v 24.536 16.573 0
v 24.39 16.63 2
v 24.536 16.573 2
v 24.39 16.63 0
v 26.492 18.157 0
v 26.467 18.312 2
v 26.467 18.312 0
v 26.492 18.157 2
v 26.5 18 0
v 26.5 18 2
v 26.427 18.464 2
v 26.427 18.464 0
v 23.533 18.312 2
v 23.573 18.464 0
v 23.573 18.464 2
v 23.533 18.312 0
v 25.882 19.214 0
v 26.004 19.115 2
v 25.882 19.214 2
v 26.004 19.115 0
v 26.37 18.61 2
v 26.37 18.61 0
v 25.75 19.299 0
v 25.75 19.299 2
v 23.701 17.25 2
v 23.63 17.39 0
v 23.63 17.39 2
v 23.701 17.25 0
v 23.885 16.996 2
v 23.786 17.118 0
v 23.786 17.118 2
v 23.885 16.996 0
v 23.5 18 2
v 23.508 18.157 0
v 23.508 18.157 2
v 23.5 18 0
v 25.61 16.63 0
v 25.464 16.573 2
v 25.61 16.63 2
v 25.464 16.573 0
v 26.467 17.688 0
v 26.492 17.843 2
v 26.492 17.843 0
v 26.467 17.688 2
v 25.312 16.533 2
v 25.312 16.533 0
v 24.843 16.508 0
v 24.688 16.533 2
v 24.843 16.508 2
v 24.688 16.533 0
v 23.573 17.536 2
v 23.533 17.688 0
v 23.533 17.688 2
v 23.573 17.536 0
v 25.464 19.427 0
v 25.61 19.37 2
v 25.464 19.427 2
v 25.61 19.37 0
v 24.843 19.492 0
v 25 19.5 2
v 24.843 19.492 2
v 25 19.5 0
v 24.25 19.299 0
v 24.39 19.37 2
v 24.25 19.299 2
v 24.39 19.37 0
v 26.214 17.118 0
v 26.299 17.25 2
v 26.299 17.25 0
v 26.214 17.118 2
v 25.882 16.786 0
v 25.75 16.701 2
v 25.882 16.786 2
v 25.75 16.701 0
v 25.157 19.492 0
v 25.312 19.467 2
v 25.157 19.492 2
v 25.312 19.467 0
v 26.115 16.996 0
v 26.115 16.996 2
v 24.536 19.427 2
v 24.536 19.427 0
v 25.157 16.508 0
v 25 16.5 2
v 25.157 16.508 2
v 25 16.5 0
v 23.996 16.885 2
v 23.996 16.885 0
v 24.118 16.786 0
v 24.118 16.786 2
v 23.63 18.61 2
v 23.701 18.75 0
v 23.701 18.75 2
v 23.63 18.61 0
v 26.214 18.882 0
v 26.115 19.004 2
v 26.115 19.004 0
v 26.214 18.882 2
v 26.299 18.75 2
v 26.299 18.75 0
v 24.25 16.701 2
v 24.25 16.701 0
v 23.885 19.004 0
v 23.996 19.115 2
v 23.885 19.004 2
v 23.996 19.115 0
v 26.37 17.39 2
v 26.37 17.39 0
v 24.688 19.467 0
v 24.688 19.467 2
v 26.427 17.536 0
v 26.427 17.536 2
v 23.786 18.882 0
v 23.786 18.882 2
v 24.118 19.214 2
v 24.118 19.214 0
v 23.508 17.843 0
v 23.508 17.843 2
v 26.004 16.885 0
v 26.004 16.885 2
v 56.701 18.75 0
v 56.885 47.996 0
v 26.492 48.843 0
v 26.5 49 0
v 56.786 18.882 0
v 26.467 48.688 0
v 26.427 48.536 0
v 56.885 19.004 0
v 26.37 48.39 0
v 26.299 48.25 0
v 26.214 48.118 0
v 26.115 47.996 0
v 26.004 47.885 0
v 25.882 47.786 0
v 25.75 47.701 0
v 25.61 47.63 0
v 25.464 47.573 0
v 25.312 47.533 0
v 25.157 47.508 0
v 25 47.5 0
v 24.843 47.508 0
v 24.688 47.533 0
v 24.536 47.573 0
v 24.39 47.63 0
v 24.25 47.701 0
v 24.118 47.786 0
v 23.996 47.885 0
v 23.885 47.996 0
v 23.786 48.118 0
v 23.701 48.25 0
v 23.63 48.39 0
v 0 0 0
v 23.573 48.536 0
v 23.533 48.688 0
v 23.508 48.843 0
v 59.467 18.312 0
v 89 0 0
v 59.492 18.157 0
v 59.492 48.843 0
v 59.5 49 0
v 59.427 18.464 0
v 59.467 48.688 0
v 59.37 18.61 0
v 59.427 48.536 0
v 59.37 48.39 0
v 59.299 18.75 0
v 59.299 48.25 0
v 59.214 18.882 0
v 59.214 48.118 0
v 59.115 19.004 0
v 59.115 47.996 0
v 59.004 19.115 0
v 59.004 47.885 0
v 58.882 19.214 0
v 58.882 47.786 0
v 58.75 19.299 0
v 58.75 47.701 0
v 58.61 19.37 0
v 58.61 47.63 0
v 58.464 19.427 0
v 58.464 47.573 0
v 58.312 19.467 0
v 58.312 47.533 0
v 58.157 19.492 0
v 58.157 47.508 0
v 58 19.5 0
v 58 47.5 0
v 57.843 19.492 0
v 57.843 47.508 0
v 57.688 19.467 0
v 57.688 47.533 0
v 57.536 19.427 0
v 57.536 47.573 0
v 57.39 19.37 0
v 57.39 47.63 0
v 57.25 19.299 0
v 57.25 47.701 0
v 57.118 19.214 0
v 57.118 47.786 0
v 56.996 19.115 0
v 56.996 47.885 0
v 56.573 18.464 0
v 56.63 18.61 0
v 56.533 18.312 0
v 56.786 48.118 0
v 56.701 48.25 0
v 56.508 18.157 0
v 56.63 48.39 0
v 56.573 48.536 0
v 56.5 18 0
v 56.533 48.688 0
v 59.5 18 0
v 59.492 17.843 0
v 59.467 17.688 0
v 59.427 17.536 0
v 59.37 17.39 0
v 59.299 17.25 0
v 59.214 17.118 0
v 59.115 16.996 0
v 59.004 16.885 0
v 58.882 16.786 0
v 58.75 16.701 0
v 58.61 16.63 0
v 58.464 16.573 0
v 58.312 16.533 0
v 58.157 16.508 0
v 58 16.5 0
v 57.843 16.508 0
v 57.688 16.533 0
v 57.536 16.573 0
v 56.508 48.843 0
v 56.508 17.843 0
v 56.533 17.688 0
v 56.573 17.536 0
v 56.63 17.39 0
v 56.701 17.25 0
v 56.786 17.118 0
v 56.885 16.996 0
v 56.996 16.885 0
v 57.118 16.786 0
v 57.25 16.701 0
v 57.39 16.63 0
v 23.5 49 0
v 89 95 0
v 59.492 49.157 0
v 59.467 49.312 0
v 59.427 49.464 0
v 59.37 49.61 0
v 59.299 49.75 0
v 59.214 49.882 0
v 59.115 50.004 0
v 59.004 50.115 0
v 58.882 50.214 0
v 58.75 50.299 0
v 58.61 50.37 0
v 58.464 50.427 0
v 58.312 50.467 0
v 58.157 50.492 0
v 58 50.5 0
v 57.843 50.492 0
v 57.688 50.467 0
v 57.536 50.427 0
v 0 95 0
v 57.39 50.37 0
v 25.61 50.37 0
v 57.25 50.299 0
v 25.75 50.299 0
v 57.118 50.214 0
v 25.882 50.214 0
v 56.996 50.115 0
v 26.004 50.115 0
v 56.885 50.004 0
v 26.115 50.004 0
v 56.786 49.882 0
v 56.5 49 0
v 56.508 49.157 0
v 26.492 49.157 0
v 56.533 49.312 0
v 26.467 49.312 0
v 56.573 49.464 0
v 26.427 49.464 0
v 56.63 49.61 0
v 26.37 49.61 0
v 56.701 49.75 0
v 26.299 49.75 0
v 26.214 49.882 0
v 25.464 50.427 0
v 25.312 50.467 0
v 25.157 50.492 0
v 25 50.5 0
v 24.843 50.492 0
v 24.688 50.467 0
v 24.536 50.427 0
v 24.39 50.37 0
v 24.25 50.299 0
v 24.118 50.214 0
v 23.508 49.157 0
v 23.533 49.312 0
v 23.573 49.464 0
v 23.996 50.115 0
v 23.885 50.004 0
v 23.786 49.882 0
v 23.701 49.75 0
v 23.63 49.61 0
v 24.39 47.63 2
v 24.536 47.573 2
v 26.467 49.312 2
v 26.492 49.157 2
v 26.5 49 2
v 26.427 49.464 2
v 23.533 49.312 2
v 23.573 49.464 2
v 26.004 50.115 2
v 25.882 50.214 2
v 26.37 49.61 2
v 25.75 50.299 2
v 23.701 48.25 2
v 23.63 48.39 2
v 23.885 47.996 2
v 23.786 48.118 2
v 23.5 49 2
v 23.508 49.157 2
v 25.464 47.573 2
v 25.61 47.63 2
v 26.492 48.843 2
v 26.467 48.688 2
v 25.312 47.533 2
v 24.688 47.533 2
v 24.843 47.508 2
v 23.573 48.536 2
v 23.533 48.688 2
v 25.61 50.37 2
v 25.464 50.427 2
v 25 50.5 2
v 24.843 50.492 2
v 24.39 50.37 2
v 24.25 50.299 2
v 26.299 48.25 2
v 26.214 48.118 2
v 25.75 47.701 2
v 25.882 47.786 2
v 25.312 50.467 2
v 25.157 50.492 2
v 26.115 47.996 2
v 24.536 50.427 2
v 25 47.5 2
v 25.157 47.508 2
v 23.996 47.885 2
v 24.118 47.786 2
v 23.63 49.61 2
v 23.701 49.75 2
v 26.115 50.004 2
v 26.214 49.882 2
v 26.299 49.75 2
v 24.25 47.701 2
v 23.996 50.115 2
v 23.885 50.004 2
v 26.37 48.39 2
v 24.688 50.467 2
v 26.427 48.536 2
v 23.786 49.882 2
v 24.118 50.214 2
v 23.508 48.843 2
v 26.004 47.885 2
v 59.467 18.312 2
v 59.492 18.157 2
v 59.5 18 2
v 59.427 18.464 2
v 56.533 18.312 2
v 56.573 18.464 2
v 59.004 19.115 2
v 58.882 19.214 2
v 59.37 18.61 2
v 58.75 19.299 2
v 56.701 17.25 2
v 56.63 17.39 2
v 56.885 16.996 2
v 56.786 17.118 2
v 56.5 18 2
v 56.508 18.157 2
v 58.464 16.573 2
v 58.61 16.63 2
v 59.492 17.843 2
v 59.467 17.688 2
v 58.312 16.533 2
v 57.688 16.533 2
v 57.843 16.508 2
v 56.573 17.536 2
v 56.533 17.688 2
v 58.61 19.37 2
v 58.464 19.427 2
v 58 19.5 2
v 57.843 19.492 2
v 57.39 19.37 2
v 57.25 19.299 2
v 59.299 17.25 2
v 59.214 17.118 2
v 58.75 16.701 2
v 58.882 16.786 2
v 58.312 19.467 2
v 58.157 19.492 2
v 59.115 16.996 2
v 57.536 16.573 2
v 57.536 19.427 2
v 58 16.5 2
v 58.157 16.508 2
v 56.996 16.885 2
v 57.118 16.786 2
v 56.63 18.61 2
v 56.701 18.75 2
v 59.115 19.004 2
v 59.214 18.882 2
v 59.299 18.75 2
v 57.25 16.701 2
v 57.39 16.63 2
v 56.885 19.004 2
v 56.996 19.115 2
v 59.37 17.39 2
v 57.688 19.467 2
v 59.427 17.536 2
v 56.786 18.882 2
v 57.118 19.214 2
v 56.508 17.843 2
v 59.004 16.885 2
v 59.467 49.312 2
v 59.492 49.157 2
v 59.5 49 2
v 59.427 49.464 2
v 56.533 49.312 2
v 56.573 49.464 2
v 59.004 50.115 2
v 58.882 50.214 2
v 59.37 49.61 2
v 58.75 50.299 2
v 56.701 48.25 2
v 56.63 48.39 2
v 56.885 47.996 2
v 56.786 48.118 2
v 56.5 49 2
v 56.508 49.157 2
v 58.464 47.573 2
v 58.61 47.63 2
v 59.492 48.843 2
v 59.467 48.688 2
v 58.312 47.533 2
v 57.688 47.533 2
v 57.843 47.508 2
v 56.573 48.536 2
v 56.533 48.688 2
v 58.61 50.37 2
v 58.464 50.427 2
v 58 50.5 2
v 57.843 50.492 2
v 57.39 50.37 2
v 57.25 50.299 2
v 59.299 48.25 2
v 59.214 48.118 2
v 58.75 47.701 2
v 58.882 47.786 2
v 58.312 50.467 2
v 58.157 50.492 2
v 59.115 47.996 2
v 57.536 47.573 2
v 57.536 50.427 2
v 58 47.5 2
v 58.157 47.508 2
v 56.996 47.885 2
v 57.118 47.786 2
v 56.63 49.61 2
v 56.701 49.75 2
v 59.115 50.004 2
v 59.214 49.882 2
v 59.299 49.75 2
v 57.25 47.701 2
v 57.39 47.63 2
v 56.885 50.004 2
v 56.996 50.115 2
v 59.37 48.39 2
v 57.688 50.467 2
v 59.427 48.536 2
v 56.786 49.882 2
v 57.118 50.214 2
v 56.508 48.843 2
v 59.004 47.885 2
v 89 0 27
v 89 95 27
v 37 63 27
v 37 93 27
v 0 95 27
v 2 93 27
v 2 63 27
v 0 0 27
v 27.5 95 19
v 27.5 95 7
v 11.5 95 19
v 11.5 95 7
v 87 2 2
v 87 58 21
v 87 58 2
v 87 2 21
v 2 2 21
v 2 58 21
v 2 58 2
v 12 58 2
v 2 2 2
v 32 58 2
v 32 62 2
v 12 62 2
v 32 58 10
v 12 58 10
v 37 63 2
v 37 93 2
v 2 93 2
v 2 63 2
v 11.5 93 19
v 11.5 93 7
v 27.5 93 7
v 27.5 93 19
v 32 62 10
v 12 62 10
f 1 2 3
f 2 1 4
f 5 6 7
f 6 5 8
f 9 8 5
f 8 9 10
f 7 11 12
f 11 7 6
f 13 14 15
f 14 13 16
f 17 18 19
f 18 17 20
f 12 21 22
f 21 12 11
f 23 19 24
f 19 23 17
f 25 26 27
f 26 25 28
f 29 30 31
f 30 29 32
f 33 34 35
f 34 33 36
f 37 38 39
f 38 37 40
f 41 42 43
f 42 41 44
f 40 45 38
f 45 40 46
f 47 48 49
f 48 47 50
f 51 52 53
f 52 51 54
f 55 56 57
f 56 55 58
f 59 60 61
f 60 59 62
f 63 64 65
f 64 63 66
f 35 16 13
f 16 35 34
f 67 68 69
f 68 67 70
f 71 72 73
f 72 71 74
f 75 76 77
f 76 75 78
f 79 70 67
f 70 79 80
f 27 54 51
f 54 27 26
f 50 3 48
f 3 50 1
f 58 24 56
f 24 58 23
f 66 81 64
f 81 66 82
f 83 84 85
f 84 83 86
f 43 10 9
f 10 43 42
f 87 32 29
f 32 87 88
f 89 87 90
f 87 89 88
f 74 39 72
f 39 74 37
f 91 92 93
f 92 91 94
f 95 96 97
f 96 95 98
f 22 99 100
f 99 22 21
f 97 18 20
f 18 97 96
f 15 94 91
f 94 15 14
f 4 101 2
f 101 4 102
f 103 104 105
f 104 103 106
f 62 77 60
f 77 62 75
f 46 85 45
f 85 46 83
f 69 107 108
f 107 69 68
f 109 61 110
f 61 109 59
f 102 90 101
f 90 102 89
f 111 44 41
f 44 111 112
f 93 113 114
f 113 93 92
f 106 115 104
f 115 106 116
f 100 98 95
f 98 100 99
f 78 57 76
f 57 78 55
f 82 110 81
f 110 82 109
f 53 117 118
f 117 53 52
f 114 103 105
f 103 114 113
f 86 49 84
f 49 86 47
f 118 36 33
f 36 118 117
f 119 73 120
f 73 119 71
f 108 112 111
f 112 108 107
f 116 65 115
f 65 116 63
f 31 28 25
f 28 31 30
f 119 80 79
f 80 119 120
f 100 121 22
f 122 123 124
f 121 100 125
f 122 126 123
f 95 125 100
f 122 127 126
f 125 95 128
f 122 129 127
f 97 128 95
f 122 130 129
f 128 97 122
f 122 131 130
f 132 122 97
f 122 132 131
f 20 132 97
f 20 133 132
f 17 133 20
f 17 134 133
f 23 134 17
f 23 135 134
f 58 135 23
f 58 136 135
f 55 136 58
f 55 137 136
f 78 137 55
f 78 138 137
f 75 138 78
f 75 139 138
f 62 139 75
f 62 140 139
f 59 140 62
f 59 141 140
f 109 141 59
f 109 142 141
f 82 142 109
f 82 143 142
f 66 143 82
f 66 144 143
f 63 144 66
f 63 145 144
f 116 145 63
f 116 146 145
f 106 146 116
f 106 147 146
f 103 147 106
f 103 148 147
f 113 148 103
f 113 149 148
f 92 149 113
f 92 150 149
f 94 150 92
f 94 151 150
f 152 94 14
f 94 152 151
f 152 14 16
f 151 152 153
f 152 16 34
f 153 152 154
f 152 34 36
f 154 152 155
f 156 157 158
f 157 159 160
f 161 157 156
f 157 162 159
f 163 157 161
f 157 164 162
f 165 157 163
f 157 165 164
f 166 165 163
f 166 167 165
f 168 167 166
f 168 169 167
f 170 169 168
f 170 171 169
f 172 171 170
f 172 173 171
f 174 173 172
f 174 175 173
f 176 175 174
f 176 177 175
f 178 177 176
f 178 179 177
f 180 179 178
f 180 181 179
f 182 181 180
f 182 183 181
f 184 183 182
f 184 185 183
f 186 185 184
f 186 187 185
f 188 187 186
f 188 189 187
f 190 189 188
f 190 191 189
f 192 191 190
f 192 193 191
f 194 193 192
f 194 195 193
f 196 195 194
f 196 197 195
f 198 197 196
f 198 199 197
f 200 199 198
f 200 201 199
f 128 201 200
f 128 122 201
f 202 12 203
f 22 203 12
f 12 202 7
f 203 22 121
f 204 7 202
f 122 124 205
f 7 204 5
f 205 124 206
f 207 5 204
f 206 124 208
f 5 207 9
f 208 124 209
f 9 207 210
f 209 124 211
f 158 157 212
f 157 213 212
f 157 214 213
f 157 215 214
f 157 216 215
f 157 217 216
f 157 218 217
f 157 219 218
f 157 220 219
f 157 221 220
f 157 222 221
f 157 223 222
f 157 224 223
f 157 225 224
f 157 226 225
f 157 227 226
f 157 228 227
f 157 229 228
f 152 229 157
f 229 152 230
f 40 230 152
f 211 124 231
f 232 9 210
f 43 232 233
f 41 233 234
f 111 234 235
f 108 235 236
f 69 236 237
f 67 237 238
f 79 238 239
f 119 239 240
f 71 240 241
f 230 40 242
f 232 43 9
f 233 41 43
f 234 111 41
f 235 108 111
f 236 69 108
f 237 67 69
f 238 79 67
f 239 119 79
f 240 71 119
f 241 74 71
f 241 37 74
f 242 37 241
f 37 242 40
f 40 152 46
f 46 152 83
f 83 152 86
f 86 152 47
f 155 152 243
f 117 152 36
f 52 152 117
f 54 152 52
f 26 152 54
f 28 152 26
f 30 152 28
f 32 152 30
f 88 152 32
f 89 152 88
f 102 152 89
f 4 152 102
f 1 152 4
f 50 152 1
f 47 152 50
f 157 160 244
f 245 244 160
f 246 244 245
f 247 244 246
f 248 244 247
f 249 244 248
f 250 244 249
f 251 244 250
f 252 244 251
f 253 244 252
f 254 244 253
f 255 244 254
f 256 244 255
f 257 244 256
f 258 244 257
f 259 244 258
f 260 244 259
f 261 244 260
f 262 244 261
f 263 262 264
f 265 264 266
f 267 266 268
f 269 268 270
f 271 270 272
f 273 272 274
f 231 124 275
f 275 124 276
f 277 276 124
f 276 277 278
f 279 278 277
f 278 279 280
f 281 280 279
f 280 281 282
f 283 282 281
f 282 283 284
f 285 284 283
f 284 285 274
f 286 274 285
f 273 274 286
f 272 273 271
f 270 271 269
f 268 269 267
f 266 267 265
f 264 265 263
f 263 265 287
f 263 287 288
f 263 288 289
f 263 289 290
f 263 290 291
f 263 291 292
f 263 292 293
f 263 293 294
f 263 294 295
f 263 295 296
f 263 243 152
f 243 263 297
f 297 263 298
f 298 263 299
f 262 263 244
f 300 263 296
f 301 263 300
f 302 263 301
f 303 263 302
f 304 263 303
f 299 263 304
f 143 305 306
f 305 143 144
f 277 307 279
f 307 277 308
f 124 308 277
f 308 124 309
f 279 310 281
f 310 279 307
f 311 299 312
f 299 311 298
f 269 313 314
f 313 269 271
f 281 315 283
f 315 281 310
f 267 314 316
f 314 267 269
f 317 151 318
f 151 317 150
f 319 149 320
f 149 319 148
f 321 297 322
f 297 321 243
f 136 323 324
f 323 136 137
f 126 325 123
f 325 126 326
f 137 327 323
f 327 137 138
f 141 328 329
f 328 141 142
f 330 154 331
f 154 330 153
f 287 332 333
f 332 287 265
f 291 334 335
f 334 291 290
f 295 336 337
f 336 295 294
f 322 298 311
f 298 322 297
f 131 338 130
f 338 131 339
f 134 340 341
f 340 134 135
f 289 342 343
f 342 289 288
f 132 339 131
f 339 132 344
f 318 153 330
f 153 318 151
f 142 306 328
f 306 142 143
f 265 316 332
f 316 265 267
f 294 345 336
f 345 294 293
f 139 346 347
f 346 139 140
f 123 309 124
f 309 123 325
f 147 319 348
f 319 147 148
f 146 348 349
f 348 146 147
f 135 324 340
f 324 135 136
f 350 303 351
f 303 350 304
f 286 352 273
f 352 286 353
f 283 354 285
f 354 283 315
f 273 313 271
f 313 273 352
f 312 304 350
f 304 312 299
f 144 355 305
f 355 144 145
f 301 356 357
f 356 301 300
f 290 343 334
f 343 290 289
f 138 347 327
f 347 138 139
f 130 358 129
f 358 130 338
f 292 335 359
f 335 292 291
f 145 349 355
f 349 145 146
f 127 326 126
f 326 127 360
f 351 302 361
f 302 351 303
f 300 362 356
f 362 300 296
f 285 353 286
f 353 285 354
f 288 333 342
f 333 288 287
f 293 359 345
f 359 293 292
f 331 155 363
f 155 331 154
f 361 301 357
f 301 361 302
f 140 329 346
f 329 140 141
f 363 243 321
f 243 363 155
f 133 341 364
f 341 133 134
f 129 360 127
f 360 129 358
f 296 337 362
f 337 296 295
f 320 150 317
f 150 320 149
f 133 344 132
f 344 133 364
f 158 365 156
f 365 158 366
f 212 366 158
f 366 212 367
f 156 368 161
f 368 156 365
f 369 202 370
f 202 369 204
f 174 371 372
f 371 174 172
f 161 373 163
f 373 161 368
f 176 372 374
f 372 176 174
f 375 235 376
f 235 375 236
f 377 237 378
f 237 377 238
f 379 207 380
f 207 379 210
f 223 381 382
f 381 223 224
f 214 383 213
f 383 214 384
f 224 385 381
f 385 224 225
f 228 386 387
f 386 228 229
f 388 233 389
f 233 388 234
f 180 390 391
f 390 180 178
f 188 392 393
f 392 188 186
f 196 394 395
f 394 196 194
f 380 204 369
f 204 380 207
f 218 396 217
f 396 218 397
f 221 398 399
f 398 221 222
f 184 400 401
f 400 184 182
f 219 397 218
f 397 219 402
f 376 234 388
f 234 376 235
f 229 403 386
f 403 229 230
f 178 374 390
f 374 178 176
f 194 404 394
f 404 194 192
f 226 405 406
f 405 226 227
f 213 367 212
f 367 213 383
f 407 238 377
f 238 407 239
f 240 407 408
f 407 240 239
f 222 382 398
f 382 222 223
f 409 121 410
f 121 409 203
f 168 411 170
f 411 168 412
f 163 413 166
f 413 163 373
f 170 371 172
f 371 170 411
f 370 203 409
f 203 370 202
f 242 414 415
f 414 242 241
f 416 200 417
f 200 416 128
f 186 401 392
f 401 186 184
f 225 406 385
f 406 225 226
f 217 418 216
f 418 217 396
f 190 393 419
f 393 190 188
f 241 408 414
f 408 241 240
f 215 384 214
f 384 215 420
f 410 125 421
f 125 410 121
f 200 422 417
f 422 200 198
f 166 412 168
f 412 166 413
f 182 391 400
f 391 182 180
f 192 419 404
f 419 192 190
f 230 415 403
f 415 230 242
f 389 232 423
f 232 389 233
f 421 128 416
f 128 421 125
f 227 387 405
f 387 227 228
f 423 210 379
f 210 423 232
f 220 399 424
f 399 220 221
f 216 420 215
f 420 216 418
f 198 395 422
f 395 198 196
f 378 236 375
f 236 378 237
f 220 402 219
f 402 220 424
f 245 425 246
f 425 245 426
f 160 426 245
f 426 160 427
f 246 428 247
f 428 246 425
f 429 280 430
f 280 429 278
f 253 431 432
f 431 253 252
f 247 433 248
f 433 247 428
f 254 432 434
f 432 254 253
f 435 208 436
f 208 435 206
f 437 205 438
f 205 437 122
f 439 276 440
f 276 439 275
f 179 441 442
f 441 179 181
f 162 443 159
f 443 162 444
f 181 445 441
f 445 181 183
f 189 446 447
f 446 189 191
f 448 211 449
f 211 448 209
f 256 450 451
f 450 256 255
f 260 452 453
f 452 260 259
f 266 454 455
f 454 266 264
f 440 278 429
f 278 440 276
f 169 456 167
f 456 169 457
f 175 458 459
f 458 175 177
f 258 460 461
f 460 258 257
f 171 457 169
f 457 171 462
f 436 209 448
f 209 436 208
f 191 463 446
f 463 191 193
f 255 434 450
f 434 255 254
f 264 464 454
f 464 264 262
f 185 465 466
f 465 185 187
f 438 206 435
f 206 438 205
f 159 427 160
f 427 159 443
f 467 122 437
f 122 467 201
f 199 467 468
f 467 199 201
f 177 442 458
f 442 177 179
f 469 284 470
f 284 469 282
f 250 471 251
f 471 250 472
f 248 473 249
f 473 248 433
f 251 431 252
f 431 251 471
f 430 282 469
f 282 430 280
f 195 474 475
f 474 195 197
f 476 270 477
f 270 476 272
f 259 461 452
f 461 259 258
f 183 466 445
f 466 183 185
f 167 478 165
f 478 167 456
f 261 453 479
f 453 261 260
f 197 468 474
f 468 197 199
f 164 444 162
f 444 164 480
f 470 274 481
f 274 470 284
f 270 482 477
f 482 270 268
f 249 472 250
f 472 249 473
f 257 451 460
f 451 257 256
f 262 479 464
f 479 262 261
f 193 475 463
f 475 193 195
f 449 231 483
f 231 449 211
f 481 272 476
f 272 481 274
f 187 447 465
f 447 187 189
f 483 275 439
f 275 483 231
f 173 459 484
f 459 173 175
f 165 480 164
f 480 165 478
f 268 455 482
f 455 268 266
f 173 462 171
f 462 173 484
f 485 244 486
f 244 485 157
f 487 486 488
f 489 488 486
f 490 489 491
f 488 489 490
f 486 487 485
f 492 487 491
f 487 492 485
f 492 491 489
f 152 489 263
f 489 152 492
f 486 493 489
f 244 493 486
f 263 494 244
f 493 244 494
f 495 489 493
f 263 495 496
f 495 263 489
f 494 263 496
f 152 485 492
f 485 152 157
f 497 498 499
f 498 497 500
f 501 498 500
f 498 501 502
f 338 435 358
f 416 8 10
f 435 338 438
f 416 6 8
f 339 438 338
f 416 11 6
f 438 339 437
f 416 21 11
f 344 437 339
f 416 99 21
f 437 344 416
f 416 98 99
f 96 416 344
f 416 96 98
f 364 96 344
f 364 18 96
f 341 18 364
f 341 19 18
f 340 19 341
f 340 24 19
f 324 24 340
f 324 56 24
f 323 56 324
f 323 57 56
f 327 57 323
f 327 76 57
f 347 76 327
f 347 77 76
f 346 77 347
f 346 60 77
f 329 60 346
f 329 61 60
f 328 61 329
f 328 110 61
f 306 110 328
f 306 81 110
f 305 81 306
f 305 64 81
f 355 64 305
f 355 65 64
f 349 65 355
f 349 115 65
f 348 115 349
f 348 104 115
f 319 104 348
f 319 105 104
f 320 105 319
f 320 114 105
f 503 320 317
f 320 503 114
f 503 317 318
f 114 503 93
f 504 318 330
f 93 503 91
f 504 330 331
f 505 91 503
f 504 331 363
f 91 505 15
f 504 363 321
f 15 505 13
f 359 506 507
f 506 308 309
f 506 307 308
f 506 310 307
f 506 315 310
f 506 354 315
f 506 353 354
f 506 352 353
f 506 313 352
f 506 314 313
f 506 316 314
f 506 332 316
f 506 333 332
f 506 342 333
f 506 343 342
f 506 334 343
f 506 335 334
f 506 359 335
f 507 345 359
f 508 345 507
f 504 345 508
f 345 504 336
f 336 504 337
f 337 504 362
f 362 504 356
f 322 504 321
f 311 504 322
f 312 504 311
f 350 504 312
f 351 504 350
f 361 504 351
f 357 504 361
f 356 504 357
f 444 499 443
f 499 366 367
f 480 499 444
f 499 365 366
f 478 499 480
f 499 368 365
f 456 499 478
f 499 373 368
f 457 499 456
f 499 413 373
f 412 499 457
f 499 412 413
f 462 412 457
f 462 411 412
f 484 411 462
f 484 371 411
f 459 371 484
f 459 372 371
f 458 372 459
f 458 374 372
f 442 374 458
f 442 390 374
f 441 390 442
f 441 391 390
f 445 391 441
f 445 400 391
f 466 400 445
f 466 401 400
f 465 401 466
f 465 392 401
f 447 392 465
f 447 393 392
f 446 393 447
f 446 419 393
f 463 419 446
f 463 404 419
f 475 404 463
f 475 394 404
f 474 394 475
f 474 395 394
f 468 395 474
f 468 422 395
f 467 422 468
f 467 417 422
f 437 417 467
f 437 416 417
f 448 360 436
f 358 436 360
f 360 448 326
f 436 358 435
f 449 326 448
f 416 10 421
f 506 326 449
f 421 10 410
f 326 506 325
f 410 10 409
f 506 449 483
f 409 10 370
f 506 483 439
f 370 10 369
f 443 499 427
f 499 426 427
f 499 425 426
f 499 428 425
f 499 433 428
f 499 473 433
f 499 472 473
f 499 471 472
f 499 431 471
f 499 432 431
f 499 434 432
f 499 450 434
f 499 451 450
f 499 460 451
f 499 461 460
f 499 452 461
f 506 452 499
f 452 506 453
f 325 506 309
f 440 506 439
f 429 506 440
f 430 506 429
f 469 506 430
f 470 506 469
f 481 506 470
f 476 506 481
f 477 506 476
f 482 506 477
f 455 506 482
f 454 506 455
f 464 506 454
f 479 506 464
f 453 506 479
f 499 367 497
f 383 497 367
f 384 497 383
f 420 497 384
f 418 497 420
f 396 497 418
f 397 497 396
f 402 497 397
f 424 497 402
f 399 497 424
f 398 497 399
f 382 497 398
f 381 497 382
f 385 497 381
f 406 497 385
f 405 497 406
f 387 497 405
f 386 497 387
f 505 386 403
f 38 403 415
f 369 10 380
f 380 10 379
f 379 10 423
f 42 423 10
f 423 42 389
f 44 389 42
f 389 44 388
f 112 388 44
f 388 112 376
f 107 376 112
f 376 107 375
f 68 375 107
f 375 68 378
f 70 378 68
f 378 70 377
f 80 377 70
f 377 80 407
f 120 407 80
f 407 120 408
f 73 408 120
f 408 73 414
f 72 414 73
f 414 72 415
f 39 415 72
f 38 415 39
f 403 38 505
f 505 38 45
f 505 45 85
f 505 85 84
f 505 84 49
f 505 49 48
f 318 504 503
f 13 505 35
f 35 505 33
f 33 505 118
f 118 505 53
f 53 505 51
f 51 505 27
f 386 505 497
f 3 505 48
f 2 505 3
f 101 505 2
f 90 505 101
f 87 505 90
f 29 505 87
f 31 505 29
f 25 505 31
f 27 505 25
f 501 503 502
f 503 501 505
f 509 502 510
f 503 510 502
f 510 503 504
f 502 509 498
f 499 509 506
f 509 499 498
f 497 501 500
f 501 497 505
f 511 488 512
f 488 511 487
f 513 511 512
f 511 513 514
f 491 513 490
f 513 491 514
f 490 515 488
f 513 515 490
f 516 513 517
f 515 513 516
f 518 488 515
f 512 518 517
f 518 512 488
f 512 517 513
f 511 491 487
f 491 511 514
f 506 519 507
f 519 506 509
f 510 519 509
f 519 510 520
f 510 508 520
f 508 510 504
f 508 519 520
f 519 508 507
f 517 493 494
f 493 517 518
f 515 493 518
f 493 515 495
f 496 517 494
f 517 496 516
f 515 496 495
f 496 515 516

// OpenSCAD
// Wildtype — Single-piece Pi + Webcam Tray
// Print time: ~30 min at 0.3mm layer height, 20% infill
// Material: PLA, ~15g

$fn = 60;

// Dimensions (mm)
pi_w = 85;
pi_d = 56;
pi_h = 17;
cam_w = 35;
cam_d = 30;
cam_h = 25;
wall = 2;
base = 2;
spacing = 5;
total_w = pi_w + wall * 2;
total_d = pi_d + cam_d + spacing + wall * 2;
total_h = max(pi_h, cam_h) + wall;

module tray() {
    difference() {
        // Outer shell
        cube([total_w, total_d, total_h]);

        // Pi cavity
        translate([wall, wall, base])
            cube([pi_w, pi_d, pi_h + wall]);

        // Camera cavity
        translate([wall, pi_d + spacing + wall, base])
            cube([cam_w, cam_d, cam_h + wall]);

        // Cable slot (Pi side)
        translate([wall + 10, wall + pi_d, base])
            cube([20, wall + 2, 8]);

        // Camera lens hole
        translate([wall + cam_w / 2 - 8, pi_d + spacing + wall + cam_d, base + 5])
            cube([16, wall + 2, 12]);

        // Mounting holes (Pi M2.5)
        for (x = [25, 58], y = [18, 49]) {
            translate([x, y, 0])
                cylinder(h = base + 1, d = 3);
        }
    }
}

tray();
